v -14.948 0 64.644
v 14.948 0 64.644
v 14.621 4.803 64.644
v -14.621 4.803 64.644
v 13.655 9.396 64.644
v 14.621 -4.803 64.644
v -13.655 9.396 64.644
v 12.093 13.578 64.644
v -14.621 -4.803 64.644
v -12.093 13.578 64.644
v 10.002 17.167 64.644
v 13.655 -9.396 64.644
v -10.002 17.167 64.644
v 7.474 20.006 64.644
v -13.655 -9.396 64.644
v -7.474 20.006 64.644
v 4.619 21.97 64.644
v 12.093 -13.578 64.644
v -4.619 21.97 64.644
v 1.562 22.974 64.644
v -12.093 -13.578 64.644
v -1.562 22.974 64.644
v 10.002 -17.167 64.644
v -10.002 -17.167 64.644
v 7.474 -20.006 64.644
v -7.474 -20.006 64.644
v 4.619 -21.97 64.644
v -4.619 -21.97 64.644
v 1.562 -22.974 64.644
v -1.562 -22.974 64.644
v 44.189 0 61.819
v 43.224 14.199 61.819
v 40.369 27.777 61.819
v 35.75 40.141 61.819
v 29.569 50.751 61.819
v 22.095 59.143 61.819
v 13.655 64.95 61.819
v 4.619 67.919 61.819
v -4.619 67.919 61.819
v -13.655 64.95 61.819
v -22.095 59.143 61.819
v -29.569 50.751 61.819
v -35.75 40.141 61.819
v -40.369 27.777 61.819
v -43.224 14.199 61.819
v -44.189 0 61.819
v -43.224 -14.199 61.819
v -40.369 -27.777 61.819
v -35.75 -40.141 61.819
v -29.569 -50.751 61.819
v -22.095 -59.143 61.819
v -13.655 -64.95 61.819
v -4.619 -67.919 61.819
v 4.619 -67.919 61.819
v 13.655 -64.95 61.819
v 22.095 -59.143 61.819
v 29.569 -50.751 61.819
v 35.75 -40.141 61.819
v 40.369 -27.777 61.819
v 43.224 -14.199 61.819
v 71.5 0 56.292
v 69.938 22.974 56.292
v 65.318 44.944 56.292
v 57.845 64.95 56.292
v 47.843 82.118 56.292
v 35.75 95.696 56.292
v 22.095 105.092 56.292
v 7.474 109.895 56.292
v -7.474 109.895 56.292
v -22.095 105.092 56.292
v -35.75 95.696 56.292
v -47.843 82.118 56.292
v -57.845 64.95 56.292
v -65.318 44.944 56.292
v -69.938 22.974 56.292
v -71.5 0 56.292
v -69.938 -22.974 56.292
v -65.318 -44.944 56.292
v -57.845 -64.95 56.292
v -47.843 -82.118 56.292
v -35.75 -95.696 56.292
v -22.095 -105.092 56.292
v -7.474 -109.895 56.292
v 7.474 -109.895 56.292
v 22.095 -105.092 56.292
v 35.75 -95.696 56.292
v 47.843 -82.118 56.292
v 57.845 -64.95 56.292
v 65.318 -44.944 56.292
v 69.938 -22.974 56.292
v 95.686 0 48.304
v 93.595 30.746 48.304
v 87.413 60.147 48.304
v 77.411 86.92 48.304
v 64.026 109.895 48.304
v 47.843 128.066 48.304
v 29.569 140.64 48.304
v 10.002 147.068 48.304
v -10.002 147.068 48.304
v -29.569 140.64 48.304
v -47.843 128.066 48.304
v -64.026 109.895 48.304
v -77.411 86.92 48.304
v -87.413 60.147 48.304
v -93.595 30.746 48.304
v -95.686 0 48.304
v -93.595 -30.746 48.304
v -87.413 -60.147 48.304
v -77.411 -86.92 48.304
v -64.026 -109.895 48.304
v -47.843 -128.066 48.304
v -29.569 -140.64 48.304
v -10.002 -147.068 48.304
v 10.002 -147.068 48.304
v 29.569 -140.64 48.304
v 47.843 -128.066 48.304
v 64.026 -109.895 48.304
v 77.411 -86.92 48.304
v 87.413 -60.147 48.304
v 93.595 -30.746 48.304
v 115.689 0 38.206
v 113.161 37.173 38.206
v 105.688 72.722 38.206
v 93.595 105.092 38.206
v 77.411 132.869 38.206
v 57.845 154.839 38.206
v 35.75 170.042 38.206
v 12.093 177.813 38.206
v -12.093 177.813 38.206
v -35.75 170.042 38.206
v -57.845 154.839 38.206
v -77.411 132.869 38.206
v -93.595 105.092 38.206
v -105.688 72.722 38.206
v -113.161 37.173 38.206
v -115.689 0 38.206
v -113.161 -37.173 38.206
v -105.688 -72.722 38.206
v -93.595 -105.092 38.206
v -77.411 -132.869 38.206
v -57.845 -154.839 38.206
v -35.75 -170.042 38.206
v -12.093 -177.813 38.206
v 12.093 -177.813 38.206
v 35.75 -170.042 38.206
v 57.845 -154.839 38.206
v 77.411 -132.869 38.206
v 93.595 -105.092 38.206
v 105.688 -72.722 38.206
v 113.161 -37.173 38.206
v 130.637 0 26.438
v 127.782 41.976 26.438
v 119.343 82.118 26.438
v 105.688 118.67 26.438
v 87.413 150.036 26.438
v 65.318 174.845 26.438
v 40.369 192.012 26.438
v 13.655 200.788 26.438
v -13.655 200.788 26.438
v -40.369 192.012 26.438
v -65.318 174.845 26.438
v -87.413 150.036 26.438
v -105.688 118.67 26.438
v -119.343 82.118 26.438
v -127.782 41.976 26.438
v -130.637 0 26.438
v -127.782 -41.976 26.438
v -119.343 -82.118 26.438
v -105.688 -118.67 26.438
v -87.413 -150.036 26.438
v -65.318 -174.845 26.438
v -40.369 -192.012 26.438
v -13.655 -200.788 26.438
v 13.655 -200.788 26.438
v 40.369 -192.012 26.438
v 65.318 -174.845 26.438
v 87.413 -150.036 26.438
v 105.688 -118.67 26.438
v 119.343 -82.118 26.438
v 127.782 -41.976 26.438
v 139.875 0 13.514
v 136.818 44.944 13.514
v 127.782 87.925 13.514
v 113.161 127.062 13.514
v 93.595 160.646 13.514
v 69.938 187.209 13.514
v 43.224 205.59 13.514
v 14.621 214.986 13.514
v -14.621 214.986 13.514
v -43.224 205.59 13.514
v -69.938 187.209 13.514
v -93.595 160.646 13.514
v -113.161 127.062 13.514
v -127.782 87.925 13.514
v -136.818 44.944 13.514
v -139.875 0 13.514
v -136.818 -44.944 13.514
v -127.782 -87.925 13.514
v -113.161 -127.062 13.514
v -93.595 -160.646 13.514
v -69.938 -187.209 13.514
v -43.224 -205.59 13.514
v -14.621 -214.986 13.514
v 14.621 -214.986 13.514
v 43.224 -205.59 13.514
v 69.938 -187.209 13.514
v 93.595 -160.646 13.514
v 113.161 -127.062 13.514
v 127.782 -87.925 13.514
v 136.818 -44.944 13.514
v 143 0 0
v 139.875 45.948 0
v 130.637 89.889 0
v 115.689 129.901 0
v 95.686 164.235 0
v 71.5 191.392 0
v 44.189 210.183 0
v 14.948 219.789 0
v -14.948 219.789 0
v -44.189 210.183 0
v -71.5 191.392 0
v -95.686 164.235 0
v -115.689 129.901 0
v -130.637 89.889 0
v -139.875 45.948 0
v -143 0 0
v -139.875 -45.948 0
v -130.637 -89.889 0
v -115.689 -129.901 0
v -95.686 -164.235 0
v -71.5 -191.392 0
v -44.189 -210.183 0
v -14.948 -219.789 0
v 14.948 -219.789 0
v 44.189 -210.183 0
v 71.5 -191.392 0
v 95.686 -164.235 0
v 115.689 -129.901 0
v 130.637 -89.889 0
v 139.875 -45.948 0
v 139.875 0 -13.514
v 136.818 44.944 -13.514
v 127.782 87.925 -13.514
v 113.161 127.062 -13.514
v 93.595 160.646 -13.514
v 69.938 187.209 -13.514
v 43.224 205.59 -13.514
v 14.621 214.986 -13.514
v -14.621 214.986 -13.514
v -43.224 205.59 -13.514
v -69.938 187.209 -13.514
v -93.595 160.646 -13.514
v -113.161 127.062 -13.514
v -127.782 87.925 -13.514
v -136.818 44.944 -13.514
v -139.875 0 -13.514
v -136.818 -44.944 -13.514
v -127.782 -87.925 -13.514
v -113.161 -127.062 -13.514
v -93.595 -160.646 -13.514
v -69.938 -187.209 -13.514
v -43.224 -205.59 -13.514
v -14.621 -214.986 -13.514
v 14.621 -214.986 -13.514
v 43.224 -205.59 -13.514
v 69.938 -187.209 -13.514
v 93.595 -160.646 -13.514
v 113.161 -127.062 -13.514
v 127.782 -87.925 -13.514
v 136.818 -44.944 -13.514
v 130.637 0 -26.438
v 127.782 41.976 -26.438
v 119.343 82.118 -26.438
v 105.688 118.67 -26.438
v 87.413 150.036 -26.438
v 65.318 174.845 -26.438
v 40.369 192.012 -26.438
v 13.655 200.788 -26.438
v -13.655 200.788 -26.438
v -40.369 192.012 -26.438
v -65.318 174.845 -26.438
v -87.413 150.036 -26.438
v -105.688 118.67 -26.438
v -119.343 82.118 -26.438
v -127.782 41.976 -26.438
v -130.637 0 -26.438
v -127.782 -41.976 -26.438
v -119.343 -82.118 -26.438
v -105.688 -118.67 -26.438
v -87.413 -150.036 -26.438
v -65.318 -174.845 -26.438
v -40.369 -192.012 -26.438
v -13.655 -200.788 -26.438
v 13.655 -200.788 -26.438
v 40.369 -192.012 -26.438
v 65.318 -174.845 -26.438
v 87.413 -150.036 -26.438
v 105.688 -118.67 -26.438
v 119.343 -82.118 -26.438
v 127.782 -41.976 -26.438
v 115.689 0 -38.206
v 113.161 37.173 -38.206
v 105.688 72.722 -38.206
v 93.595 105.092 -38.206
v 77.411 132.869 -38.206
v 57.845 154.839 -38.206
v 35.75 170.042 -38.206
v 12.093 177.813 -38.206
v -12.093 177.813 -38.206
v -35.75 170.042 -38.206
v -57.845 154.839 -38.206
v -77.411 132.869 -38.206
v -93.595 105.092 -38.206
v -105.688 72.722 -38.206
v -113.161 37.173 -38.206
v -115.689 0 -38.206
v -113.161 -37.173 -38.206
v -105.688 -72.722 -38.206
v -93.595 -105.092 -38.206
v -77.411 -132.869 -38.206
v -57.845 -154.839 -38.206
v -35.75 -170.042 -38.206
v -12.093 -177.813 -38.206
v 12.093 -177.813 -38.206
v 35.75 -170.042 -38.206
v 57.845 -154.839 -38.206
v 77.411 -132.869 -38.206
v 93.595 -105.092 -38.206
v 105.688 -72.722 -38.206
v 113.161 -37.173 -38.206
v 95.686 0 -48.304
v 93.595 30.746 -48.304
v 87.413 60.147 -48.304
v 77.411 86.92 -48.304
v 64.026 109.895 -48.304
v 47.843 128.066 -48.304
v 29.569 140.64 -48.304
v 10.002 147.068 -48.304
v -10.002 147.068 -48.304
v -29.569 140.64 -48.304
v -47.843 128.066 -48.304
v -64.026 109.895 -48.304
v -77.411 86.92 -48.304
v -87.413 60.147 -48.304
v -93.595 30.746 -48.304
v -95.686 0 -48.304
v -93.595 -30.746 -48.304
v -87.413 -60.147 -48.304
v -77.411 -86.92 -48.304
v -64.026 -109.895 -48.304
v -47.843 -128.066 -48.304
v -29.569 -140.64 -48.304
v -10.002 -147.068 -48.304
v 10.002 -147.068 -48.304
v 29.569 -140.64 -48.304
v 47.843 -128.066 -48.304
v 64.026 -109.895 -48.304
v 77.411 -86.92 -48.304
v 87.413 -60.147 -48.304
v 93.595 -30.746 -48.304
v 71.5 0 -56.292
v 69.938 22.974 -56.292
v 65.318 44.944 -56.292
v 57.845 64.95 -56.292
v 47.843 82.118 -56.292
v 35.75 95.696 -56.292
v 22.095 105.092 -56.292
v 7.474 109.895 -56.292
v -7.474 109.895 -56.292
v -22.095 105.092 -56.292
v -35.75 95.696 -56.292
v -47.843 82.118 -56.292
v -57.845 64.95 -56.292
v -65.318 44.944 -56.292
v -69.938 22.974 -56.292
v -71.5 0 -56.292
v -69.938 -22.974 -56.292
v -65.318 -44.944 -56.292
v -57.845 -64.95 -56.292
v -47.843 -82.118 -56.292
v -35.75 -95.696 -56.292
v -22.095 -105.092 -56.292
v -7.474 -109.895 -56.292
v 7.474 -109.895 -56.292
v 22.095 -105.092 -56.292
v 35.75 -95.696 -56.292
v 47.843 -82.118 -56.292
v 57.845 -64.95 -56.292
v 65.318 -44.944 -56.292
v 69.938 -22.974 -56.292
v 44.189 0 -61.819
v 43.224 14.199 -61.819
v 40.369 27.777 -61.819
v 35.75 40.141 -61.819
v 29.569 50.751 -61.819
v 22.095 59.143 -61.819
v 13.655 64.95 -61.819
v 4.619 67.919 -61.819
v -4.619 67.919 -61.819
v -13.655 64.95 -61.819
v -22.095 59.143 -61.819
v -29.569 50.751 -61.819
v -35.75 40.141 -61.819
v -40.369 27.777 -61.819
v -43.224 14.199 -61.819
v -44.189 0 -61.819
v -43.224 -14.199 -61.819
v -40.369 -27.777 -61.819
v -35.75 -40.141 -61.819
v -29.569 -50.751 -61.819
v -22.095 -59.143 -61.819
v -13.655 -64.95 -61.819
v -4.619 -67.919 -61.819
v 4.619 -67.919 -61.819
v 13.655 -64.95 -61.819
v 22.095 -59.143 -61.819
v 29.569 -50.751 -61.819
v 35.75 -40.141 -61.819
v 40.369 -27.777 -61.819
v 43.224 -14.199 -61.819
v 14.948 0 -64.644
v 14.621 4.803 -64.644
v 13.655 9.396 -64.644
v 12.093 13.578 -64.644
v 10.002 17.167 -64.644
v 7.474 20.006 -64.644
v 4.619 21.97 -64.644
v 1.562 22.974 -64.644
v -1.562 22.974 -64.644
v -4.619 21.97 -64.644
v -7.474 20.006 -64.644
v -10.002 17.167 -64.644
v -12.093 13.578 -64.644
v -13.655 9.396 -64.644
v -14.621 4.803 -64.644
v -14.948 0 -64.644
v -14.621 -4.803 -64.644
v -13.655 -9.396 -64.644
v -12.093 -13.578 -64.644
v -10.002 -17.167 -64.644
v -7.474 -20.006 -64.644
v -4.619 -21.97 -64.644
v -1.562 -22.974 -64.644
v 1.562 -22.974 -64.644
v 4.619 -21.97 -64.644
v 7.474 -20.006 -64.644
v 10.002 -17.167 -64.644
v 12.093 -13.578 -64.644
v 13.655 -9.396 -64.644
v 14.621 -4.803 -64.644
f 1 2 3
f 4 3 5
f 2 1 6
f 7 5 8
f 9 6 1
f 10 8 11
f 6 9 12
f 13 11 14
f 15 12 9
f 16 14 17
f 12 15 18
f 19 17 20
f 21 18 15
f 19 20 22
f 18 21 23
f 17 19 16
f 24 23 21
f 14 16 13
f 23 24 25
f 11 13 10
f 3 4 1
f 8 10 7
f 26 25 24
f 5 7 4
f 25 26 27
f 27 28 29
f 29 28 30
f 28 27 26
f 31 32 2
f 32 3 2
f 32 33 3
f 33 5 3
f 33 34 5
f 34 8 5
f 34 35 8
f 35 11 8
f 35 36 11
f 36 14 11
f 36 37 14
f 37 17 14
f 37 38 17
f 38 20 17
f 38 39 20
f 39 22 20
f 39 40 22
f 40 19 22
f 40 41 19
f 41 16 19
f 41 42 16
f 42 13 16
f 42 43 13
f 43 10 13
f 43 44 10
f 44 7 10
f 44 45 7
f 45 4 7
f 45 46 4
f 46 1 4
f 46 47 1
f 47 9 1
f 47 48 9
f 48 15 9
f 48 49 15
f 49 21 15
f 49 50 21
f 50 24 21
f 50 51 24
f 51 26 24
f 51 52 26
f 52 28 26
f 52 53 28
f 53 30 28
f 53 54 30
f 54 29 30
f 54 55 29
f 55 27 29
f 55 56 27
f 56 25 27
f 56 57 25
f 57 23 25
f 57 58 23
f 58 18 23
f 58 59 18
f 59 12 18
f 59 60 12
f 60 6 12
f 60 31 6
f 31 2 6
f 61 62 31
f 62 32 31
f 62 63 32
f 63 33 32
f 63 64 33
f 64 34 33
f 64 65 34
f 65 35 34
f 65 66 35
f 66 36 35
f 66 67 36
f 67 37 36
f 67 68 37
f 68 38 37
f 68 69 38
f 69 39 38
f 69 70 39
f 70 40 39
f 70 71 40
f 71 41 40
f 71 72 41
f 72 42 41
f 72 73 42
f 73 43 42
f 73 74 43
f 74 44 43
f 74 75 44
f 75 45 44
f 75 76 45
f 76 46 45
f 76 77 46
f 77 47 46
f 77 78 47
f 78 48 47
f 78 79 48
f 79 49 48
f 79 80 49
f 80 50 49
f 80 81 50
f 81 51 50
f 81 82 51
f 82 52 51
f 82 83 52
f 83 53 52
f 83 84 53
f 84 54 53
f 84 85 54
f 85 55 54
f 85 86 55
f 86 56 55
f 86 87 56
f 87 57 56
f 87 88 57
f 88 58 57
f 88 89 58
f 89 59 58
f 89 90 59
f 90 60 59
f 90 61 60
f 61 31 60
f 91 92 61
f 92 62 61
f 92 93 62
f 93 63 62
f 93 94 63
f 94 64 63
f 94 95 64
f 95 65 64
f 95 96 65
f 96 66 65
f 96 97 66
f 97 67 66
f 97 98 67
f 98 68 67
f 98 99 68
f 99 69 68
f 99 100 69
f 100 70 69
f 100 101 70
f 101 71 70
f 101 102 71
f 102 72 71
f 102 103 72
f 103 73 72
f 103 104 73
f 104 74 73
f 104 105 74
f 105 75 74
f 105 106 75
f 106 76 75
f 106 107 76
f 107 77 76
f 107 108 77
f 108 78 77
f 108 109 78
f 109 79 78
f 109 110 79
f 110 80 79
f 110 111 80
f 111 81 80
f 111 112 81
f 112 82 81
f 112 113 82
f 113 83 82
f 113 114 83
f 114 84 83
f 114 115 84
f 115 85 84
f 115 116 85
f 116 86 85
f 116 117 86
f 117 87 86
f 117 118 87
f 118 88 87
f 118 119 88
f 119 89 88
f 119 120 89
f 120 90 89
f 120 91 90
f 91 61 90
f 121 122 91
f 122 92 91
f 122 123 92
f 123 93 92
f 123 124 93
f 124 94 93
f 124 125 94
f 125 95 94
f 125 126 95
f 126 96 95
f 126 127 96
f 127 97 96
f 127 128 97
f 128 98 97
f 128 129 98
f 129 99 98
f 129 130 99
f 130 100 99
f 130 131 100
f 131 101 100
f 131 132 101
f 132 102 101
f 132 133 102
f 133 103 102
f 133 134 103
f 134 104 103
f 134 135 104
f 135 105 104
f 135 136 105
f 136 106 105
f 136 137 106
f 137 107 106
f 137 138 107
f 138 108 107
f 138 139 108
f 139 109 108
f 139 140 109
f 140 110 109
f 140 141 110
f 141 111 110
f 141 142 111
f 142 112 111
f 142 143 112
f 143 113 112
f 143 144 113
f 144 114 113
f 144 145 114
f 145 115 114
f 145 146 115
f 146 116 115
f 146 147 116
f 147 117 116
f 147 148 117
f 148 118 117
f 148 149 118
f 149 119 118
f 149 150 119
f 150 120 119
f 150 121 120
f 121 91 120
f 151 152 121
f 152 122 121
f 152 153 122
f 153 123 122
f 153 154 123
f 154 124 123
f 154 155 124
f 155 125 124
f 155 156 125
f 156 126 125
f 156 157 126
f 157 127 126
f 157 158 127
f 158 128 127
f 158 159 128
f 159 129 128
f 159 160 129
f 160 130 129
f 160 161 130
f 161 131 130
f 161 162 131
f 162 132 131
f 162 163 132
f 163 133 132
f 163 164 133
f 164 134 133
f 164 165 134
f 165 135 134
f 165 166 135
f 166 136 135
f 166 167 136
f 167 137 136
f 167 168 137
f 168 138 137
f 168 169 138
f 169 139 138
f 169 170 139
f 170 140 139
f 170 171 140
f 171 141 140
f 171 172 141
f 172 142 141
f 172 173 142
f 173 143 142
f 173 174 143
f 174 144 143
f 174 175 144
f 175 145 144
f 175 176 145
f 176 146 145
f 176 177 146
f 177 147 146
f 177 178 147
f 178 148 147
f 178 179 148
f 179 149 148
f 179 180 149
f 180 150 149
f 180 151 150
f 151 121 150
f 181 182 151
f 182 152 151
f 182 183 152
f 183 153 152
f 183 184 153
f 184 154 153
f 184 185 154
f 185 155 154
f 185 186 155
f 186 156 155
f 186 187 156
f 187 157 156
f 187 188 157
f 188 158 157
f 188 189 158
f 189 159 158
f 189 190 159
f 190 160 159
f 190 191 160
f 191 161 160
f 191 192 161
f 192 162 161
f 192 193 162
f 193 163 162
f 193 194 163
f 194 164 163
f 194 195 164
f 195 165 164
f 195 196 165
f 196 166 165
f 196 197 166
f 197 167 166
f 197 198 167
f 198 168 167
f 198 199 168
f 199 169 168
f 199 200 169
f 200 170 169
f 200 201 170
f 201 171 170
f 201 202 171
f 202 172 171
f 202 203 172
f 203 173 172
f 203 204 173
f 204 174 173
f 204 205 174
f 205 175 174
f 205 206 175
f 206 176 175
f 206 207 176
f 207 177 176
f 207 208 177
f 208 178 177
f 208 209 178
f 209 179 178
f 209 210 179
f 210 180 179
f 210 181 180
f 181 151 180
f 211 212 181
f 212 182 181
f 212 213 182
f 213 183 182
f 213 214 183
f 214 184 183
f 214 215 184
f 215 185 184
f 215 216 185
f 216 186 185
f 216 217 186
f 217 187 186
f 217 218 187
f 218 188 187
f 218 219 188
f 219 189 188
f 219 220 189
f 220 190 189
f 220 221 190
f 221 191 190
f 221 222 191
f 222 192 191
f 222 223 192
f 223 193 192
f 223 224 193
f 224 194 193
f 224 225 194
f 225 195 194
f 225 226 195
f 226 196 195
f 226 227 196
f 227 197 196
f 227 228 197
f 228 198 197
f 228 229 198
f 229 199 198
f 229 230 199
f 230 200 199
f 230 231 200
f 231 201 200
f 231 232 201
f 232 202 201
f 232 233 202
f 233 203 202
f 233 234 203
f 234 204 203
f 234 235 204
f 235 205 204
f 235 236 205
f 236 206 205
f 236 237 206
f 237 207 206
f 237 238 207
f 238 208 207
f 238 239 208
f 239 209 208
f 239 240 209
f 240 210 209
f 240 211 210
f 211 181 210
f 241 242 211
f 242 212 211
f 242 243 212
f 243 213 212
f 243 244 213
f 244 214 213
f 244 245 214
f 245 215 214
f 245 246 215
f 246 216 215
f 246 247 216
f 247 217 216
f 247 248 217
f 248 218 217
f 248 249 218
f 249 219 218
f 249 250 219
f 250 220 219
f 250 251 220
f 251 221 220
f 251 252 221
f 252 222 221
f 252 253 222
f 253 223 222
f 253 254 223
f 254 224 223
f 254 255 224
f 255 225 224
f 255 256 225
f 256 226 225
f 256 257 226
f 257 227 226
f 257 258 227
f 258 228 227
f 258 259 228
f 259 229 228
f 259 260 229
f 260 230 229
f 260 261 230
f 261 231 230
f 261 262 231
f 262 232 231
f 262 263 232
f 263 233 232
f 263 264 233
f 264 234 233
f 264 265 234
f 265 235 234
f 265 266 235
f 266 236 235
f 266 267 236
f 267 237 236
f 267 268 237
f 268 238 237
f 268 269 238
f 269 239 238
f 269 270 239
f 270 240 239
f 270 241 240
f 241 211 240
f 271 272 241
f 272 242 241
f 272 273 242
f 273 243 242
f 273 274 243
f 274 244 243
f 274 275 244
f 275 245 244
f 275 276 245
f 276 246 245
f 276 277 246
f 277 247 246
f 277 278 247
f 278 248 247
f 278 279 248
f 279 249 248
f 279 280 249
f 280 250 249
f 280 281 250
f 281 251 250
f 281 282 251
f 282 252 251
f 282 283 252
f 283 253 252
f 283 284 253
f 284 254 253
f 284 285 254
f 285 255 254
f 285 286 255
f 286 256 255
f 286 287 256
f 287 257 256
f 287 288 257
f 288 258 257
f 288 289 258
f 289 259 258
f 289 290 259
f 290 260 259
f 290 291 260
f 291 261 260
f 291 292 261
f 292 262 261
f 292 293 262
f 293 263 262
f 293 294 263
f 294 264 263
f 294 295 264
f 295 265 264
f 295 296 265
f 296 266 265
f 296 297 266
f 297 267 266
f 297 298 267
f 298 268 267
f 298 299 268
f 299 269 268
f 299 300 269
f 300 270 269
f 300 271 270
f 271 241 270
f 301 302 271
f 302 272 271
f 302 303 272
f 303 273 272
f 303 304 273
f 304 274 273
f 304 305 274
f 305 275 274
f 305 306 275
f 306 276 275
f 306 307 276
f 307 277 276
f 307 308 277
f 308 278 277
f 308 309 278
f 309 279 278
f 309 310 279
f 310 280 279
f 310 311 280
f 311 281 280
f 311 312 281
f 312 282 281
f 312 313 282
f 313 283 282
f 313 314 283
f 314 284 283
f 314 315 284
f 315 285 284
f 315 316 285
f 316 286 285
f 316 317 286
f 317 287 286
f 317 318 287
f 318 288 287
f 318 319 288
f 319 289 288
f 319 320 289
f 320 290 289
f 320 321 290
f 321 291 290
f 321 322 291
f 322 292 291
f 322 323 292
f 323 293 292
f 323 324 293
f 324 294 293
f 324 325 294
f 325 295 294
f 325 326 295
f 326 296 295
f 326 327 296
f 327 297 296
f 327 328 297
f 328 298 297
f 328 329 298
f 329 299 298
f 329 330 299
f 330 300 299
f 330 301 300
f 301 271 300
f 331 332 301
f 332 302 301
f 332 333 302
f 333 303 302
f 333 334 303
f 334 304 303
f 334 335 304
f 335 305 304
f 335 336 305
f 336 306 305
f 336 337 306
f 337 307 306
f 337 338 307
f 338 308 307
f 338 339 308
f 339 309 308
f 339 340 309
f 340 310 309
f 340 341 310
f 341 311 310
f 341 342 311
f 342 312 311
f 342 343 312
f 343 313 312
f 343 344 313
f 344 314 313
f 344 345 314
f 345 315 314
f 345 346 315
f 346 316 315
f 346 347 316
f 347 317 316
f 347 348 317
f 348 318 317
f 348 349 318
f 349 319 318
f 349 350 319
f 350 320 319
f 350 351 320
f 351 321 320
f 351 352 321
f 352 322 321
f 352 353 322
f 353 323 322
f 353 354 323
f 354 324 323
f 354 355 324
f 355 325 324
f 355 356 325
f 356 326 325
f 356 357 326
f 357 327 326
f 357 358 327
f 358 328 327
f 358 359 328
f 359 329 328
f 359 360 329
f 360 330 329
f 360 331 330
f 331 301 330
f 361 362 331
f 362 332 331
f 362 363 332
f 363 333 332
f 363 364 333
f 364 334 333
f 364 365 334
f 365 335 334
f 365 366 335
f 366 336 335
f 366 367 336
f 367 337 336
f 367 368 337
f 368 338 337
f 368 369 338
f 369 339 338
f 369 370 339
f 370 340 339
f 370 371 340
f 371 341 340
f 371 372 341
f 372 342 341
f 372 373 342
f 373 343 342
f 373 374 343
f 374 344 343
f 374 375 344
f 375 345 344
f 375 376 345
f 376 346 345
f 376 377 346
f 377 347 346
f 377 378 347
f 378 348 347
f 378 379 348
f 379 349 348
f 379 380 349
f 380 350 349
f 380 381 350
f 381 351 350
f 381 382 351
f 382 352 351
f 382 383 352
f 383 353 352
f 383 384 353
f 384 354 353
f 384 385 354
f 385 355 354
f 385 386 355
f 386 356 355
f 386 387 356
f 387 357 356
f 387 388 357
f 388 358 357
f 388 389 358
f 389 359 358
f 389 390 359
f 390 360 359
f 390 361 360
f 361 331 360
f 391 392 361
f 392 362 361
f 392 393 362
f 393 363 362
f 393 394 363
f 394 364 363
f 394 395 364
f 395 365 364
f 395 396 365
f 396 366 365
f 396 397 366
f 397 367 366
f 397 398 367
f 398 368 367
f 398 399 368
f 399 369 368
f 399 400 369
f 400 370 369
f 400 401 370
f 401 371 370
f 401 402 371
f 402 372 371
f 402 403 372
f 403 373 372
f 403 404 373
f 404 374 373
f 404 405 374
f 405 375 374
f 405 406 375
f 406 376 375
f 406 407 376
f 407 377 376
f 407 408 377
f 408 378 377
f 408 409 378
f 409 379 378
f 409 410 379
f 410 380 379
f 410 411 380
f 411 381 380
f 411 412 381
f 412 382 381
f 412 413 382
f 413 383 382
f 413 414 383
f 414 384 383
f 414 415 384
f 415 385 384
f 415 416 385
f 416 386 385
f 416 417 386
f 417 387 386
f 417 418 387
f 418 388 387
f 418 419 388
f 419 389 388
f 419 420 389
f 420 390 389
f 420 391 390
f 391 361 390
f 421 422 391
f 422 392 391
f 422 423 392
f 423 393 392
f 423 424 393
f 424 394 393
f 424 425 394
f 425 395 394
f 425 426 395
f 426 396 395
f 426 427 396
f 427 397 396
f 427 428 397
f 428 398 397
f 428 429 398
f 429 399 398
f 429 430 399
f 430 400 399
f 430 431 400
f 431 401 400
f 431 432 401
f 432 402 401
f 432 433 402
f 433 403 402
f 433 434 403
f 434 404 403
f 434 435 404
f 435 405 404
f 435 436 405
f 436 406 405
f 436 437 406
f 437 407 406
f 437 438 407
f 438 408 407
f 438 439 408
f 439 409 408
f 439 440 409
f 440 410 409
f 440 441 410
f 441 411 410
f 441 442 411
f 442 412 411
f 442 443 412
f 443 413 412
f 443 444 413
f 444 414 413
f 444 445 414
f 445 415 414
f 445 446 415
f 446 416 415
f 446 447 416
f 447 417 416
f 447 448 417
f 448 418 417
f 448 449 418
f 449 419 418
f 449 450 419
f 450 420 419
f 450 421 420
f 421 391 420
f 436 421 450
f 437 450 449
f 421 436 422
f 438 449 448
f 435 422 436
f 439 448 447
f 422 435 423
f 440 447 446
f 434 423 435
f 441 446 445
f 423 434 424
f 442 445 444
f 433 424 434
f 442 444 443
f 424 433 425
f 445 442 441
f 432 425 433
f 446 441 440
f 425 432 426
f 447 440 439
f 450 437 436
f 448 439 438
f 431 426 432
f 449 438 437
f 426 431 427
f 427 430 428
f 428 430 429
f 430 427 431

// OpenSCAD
// Generated by SolidPython 1.0.1 on 2020-07-29 00:46:50


scale(v = [11, 17, 5]) {
	sphere(r = 13);
}
/***********************************************
*********      SolidPython code:      **********
************************************************
 
# import packages: SolidPython
from solid import *
from solid.utils import *
from itertools import chain, combinations, permutations


class Resize:

    def __init__(self, scad_file):
        self.scad_file = scad_file
        #self.scad_file = import_scad(scad_file)
        # cone/cylinder param:
        self.r1 = 0
        self.r2 = 0
        self.h = 0
        # rectangular prism param:
        self.w = 0
        self.l = 0
        # ellipse param:
        self.r = 0

    # import OpenScad code (file name corresponds to shape)


    # classify shape + parameters
    def assign(self, param1, param2, param3):
        if self.scad_file == 'cone.scad':
            self.r1 = param1
            self.r2 = param2
            self.h = param3
        elif self.scad_file == 'cylinder.scad':
            self.r1 = param1
            self.r2 = param2
            self.h = param3
        elif self.scad_file == 'rectangularPrism.scad':
            self.h = param1
            self.l = param2
            self.w = param3
        else:
            self.r = param1
            self.h = param2

    # resize parameters
    def iterate(self):
        x = range(3, 20, 2)
        i = 1
        if self.scad_file == 'cone.scad':
            tempList = list(permutations(x, 2))
            for temp in tempList:
                param1 = temp[0]
                param2 = temp[1]
                filepath = 'produced_scad_files/' + 'cone' + str(param1) + '_' + str(param2) + '_' + '.scad'
                scad_render_to_file(cylinder(h=param1, r1=param2, r2=0), filepath)

        elif self.scad_file == 'cylinder.scad':
            tempList = list(permutations(x, 3))
            for temp in tempList:
                param1 = temp[0]
                param2 = temp[1]
                filepath = 'produced_scad_files/' + 'cylinder' + str(param1) + '_' + str(param2) + '_' + '.scad'
                scad_render_to_file(cylinder(h=param1, r1=param2, r2=param2), filepath)

        elif self.scad_file == 'rectangularPrism.scad':
            tempList = list(permutations(x, 3))
            for temp in tempList:
                param1 = temp[0]
                param2 = temp[1]
                param3 = temp[2]
                filepath = 'produced_scad_files/' + 'rectangularPrism' + str(param1) + '_' + str(param2) + '_' + str(
                    param3) + '.scad'
                scad_render_to_file(cube(size=(param1, param2, param3)), filepath)

        elif self.scad_file == 'ellipse.scad':
            tempList = list(permutations(x, 4))
            for temp in tempList:
                param1 = temp[0]
                param2 = temp[1]
                param3 = temp[2]
                param4 = temp[3]
                filepath = 'produced_scad_files/' + 'ellipse' + str(param1) + '_' + str(param2) + '_' + str(param3) + '_' + str(param4) + '.scad'
                scad_render_to_file(scale([param1, param2, param3])(sphere(r=param4)), filepath)

    def render_to_scadfile(self):
        scad_render_to_file(scad, 'example.scad') 
 
************************************************/
